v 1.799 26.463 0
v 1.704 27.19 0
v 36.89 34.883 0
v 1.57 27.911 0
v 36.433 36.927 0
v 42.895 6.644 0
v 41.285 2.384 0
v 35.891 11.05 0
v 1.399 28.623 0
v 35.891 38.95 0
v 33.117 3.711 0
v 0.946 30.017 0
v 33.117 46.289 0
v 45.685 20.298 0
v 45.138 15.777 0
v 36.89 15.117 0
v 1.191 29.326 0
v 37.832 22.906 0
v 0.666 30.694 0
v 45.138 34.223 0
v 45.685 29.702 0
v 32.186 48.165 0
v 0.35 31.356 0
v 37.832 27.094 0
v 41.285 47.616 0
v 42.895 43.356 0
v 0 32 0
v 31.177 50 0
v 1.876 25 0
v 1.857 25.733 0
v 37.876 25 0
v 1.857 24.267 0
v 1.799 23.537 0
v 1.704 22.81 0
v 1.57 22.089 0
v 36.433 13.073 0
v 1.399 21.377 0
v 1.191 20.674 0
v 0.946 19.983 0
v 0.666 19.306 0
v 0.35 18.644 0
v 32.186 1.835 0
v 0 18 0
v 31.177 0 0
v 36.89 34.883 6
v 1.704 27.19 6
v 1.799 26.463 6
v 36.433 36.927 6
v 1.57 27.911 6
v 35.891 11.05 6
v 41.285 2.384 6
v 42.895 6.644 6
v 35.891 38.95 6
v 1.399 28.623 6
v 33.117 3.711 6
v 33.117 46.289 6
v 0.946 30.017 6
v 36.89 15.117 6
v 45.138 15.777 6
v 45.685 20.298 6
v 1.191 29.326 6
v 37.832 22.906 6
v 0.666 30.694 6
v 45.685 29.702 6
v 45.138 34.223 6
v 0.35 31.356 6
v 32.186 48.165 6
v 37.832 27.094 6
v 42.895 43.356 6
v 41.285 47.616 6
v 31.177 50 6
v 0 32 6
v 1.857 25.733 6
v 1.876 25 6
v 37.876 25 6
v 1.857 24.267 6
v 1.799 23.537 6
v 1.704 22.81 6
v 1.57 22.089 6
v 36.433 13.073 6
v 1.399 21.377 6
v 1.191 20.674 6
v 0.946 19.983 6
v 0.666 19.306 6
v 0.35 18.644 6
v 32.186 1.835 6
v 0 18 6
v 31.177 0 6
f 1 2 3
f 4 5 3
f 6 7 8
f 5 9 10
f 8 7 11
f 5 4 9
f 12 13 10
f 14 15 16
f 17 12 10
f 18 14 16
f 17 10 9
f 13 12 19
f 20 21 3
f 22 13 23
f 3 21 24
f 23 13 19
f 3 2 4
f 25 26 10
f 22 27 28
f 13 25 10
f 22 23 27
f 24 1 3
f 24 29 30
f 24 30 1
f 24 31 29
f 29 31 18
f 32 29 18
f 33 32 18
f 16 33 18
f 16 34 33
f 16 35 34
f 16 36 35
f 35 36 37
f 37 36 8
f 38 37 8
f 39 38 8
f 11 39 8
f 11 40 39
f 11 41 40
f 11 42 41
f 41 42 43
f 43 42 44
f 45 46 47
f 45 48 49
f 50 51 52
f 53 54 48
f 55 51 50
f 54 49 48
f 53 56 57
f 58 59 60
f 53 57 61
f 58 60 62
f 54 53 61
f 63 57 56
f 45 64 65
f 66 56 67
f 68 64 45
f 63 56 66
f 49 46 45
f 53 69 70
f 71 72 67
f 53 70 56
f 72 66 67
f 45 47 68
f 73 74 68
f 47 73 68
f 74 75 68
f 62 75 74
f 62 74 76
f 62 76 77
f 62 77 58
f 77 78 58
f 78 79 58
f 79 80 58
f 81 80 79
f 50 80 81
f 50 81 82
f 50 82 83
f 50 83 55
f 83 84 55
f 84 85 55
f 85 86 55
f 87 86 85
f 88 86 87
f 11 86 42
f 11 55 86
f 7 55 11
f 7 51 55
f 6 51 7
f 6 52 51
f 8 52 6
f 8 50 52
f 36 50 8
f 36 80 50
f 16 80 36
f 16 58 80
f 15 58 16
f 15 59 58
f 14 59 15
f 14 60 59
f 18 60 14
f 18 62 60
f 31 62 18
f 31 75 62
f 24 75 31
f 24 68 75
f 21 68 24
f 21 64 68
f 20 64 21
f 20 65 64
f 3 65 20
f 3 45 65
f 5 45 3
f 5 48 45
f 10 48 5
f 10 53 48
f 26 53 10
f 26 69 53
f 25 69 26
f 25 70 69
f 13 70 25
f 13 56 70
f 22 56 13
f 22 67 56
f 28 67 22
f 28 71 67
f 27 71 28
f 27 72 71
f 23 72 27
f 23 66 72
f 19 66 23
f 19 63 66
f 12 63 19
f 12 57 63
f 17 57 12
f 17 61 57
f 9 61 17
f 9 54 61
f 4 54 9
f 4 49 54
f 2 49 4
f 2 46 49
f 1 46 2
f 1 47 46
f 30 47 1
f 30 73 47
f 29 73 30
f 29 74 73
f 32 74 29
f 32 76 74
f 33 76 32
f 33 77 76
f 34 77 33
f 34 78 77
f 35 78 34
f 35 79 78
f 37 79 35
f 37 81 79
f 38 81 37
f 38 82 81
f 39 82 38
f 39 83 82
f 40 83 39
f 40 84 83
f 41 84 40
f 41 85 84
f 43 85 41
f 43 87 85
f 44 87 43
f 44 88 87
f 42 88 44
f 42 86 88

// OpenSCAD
$fn = 32;

// ----------------------------------------------------------------------
// Gear sector: 4 teeth on 60 degrees
// ----------------------------------------------------------------------

// --- parameters (mm) ---
sector_angle = 60;        // sector angle, degrees
root_r = 50;              // root circle radius
tooth_h = 8;              // tooth height over the root circle
teeth = 4;                // number of teeth on the sector
hub_r = 14;               // hub bore radius
plate_t = 6;              // sector thickness, Z
arc_step = 3;             // sampling step of the root/hub arcs, degrees
fit_tol = 0.1;            // declared fit tolerance (prompt contract)
free_tol = 0.5;           // declared free tolerance (prompt contract)

tip_r = root_r + tooth_h;  // tip circle radius

profile = [[31.177, 0], [32.186, 1.835], [33.117, 3.711], [41.285, 2.384], [42.895, 6.644], [35.891, 11.05], [36.433, 13.073], [36.89, 15.117], [45.138, 15.777], [45.685, 20.298], [37.832, 22.906], [37.876, 25], [37.832, 27.094], [45.685, 29.702], [45.138, 34.223], [36.89, 34.883], [36.433, 36.927], [35.891, 38.95], [42.895, 43.356], [41.285, 47.616], [33.117, 46.289], [32.186, 48.165], [31.177, 50], [0, 32], [0.35, 31.356], [0.666, 30.694], [0.946, 30.017], [1.191, 29.326], [1.399, 28.623], [1.57, 27.911], [1.704, 27.19], [1.799, 26.463], [1.857, 25.733], [1.876, 25], [1.857, 24.267], [1.799, 23.537], [1.704, 22.81], [1.57, 22.089], [1.399, 21.377], [1.191, 20.674], [0.946, 19.983], [0.666, 19.306], [0.35, 18.644], [0, 18]];  // primary outline, 44 points, counter clockwise

// --- the one profile operation ---
linear_extrude(height = plate_t) polygon(points = profile);
